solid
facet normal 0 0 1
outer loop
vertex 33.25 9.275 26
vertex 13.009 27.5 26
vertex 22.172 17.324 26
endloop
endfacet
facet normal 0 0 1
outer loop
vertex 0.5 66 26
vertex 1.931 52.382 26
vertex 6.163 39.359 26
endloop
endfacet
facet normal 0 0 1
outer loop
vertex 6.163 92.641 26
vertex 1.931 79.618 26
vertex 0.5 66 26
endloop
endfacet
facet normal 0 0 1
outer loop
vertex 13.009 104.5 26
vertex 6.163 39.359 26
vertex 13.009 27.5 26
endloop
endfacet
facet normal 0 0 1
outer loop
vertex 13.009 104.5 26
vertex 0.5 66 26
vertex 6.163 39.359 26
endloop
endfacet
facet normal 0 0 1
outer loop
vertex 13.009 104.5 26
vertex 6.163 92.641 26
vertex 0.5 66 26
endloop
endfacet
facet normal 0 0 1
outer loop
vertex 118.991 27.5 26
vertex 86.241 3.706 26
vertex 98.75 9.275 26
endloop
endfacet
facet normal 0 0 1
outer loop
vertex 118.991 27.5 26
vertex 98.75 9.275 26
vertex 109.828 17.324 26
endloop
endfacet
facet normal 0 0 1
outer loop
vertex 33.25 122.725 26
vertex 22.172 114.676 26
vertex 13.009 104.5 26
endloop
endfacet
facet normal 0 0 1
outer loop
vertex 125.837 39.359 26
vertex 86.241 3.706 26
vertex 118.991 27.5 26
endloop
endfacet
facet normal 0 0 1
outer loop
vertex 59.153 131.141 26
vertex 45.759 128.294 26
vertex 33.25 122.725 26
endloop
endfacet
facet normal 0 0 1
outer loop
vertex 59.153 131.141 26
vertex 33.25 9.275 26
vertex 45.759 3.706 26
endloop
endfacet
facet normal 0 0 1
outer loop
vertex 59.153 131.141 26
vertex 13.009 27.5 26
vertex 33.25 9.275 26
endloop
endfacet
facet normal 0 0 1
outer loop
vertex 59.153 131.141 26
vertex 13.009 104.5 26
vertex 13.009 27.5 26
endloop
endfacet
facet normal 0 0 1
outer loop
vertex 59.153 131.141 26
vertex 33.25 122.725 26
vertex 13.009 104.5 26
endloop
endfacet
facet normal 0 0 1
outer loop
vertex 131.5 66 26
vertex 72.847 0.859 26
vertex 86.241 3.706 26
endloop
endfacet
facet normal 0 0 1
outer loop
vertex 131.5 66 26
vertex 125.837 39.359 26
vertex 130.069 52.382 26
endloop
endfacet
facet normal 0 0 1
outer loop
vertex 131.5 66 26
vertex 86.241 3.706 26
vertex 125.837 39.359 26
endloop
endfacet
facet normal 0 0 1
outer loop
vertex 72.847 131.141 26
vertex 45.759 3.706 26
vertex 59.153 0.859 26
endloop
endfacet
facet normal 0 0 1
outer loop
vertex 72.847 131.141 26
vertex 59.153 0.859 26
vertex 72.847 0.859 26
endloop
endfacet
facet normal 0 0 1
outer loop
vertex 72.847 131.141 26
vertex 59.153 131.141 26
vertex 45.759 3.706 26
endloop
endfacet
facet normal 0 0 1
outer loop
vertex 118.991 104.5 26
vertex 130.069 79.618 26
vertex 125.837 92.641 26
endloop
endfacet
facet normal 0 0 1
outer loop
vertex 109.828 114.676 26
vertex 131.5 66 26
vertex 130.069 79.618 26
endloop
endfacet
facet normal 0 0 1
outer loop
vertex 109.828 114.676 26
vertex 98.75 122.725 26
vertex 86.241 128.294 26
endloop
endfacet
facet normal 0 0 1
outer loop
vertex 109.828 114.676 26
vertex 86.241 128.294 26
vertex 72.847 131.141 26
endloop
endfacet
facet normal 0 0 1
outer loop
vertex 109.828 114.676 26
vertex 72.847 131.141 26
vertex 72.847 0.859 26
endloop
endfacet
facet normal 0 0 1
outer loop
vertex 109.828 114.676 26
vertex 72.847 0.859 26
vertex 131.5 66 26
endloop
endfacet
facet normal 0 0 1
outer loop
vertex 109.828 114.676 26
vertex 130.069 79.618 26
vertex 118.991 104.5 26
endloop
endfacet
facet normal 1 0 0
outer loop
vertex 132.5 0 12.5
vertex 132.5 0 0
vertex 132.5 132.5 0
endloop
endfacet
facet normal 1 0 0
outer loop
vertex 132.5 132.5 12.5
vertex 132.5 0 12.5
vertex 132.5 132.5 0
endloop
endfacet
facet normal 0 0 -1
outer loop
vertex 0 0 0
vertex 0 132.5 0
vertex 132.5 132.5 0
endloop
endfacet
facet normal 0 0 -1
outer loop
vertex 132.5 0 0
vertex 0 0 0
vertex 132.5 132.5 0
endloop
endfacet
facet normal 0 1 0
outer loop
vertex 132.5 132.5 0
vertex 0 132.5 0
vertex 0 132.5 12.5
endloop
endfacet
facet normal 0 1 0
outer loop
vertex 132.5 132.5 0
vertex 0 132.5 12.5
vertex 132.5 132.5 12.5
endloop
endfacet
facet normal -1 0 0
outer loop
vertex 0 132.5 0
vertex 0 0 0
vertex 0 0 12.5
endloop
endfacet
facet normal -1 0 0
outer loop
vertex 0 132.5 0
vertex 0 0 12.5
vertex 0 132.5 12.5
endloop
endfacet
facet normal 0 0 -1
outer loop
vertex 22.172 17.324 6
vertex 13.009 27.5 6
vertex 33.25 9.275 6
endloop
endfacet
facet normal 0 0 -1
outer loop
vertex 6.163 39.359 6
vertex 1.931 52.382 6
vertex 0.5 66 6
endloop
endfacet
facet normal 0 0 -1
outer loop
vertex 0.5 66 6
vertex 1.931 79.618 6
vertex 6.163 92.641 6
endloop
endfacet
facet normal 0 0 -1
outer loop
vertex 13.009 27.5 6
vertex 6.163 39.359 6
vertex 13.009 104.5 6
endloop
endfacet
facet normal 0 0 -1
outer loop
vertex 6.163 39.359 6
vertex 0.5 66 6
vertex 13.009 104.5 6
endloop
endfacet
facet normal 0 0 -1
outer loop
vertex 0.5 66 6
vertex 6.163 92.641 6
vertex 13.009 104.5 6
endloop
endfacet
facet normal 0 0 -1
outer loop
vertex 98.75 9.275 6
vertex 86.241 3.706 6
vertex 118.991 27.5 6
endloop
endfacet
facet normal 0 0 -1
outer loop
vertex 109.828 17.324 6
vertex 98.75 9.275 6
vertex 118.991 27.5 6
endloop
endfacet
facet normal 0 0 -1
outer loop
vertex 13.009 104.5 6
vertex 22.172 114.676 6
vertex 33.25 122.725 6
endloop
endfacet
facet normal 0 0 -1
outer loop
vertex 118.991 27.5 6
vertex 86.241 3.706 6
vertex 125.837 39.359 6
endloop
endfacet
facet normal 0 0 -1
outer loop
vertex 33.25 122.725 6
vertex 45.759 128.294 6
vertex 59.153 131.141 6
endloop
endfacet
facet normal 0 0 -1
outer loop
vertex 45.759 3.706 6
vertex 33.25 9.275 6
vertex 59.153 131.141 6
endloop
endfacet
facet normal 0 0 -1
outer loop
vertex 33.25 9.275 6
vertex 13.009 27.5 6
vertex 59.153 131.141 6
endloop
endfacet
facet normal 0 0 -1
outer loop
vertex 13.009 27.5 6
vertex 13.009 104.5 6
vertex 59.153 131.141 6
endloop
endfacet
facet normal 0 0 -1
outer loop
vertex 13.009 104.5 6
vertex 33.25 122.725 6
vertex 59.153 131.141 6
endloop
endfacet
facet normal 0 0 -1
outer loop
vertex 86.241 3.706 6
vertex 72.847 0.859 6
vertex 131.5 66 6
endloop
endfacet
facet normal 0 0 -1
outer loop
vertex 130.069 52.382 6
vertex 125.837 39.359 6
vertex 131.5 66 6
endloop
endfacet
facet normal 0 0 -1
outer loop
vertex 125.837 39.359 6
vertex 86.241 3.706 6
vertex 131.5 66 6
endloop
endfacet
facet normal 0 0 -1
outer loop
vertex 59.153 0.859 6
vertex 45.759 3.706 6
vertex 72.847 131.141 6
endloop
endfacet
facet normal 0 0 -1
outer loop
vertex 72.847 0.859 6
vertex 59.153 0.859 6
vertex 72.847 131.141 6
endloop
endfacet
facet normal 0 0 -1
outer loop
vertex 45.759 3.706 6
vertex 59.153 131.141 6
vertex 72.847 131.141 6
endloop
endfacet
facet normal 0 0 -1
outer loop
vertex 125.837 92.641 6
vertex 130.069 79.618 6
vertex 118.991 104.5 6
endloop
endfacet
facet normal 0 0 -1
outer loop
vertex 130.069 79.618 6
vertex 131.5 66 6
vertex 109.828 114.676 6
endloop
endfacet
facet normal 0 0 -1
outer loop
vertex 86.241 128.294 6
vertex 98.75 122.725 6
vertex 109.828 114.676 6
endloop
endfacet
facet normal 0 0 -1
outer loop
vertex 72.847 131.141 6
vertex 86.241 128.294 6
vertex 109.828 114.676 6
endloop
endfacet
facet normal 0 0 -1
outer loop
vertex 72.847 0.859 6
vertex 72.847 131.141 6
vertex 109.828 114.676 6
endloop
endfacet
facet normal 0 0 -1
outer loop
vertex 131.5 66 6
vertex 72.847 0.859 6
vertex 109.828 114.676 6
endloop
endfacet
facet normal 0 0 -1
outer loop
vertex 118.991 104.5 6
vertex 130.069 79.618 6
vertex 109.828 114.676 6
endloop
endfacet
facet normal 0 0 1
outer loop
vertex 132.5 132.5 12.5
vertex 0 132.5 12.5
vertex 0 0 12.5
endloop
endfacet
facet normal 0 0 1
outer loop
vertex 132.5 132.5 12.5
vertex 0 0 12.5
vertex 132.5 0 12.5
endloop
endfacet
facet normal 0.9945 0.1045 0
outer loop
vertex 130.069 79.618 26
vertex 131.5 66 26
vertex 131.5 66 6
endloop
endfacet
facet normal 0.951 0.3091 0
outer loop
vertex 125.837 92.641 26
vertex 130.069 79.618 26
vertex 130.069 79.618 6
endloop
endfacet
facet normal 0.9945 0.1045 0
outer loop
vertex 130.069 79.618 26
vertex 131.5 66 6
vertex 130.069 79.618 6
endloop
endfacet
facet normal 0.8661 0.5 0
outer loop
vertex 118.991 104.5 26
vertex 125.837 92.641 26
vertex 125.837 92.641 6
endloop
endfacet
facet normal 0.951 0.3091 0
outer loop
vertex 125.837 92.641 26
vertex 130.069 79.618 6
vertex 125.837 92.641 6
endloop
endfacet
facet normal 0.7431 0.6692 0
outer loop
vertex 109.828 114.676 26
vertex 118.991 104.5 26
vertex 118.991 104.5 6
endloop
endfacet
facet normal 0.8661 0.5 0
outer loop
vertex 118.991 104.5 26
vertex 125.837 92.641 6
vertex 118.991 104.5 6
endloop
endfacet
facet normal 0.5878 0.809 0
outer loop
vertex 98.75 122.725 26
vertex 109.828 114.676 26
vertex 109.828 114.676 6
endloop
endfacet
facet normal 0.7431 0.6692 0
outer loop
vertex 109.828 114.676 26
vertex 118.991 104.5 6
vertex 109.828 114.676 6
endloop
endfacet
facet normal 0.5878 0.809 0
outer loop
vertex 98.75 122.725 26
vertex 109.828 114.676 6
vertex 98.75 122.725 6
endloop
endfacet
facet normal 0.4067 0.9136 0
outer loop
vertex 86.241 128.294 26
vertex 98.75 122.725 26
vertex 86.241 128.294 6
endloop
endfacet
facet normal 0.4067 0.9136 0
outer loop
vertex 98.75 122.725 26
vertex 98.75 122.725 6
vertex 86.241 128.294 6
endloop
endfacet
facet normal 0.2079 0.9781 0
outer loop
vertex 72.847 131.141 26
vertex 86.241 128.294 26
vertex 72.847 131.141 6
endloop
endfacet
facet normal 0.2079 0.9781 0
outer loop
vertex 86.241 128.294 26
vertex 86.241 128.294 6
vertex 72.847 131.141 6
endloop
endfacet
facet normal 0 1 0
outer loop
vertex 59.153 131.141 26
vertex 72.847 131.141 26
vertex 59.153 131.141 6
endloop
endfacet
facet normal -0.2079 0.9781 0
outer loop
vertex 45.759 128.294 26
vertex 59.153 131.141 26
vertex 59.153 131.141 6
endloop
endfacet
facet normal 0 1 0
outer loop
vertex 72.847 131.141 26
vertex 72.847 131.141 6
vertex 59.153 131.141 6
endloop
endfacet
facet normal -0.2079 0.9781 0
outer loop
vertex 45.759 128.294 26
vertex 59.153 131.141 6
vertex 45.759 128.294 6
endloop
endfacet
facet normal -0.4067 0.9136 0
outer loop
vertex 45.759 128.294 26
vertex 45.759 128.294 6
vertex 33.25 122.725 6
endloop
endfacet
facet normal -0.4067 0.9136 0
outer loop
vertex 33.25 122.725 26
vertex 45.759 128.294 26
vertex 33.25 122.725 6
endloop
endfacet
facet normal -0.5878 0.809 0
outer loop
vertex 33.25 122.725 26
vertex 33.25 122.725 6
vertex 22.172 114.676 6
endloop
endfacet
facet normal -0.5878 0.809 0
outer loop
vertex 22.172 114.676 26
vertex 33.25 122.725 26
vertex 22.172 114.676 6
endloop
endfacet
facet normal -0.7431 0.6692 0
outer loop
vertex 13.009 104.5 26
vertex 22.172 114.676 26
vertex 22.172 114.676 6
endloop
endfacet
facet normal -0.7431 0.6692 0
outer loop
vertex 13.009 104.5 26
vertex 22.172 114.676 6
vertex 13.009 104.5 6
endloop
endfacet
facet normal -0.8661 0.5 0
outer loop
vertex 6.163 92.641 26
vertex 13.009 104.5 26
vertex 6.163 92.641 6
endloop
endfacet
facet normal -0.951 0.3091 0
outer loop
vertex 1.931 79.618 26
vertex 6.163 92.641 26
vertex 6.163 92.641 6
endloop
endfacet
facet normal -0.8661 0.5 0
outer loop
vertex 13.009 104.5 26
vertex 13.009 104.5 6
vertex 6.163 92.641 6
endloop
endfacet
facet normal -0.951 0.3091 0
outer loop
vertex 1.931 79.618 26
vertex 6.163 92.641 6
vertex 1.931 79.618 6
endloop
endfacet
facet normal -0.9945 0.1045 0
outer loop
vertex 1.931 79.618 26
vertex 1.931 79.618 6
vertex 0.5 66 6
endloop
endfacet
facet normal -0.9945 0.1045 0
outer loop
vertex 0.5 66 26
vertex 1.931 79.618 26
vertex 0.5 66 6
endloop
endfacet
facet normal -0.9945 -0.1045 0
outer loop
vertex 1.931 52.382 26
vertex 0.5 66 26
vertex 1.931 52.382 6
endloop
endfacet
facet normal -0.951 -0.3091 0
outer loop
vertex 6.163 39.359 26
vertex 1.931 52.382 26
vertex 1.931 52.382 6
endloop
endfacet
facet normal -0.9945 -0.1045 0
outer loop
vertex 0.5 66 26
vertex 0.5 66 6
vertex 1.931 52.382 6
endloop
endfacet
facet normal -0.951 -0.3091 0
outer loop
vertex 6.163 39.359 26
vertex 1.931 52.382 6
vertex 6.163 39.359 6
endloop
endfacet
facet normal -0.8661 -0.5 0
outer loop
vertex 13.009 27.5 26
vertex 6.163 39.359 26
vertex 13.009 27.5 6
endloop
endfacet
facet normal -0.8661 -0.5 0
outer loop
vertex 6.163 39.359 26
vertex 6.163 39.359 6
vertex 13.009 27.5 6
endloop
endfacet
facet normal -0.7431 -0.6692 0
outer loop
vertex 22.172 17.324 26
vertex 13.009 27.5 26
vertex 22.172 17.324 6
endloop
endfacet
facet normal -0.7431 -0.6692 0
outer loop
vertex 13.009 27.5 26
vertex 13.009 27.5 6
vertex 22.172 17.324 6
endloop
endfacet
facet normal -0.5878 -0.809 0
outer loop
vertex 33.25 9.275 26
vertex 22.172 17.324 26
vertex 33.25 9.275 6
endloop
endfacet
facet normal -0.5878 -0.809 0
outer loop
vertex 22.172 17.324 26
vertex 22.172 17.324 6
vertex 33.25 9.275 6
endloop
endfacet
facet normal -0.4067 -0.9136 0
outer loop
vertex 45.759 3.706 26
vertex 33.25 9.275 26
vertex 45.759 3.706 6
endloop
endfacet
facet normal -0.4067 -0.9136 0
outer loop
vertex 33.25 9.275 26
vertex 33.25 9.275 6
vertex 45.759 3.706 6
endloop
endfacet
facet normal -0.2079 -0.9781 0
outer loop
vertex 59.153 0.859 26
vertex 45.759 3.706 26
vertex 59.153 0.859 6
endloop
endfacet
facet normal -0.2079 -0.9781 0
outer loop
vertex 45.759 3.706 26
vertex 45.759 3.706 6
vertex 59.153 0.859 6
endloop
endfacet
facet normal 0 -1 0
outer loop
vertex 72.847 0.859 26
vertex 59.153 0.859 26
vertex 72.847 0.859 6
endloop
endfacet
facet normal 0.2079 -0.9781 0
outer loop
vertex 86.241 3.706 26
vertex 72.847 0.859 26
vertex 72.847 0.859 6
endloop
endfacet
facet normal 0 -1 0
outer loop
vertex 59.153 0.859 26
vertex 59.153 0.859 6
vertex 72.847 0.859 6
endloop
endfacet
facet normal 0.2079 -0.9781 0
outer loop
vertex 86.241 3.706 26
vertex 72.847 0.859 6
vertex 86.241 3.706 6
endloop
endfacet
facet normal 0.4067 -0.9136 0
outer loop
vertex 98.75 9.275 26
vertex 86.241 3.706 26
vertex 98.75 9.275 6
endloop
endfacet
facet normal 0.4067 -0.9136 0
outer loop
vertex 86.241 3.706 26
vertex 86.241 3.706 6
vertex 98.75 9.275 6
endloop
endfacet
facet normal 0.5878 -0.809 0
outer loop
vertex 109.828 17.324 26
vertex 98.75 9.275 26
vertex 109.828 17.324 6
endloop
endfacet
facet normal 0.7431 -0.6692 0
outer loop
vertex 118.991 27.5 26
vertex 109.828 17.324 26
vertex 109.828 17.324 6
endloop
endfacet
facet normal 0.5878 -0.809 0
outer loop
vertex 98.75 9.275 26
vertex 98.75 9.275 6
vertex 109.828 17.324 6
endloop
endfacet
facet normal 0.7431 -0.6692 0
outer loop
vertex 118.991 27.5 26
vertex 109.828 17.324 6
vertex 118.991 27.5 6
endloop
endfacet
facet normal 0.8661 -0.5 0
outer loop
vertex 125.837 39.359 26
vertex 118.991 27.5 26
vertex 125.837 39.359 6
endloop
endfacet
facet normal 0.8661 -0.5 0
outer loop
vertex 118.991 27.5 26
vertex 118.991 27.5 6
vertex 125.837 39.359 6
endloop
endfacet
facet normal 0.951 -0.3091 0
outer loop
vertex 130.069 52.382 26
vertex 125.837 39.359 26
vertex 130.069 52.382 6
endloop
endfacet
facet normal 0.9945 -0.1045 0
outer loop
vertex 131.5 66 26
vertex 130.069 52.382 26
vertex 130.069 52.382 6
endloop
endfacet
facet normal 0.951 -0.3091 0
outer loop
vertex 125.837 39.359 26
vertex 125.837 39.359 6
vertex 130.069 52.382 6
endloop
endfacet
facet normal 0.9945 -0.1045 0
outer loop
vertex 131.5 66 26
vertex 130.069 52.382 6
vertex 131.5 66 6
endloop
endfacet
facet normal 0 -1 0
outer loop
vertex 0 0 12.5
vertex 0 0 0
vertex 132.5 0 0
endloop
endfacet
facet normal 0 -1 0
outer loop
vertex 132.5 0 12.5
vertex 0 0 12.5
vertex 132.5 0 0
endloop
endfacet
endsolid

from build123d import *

# Parameters (mm, degrees)
BOX_W          = 132.5
BOX_H          = 132.5
BOX_DEPTH      = 12.5
CYLINDER_R     = 65.5
CYLINDER_DEPTH = 20


with BuildPart() as cube:
    # Box → Box (new body)
    with BuildSketch(Plane.XY):
        with Locations((66.25, 66.25)):
            Rectangle(BOX_W, BOX_H)
    extrude(amount=BOX_DEPTH)


with BuildPart() as cylinder:
    # Cylinder → Cylinder (new body)
    with BuildSketch(Plane(origin=(66, 66, 6), x_dir=(1, 0, 0), z_dir=(0, 0, 1))):
        Circle(CYLINDER_R)
    extrude(amount=CYLINDER_DEPTH)


solid = Compound([cube.part, cylinder.part])
